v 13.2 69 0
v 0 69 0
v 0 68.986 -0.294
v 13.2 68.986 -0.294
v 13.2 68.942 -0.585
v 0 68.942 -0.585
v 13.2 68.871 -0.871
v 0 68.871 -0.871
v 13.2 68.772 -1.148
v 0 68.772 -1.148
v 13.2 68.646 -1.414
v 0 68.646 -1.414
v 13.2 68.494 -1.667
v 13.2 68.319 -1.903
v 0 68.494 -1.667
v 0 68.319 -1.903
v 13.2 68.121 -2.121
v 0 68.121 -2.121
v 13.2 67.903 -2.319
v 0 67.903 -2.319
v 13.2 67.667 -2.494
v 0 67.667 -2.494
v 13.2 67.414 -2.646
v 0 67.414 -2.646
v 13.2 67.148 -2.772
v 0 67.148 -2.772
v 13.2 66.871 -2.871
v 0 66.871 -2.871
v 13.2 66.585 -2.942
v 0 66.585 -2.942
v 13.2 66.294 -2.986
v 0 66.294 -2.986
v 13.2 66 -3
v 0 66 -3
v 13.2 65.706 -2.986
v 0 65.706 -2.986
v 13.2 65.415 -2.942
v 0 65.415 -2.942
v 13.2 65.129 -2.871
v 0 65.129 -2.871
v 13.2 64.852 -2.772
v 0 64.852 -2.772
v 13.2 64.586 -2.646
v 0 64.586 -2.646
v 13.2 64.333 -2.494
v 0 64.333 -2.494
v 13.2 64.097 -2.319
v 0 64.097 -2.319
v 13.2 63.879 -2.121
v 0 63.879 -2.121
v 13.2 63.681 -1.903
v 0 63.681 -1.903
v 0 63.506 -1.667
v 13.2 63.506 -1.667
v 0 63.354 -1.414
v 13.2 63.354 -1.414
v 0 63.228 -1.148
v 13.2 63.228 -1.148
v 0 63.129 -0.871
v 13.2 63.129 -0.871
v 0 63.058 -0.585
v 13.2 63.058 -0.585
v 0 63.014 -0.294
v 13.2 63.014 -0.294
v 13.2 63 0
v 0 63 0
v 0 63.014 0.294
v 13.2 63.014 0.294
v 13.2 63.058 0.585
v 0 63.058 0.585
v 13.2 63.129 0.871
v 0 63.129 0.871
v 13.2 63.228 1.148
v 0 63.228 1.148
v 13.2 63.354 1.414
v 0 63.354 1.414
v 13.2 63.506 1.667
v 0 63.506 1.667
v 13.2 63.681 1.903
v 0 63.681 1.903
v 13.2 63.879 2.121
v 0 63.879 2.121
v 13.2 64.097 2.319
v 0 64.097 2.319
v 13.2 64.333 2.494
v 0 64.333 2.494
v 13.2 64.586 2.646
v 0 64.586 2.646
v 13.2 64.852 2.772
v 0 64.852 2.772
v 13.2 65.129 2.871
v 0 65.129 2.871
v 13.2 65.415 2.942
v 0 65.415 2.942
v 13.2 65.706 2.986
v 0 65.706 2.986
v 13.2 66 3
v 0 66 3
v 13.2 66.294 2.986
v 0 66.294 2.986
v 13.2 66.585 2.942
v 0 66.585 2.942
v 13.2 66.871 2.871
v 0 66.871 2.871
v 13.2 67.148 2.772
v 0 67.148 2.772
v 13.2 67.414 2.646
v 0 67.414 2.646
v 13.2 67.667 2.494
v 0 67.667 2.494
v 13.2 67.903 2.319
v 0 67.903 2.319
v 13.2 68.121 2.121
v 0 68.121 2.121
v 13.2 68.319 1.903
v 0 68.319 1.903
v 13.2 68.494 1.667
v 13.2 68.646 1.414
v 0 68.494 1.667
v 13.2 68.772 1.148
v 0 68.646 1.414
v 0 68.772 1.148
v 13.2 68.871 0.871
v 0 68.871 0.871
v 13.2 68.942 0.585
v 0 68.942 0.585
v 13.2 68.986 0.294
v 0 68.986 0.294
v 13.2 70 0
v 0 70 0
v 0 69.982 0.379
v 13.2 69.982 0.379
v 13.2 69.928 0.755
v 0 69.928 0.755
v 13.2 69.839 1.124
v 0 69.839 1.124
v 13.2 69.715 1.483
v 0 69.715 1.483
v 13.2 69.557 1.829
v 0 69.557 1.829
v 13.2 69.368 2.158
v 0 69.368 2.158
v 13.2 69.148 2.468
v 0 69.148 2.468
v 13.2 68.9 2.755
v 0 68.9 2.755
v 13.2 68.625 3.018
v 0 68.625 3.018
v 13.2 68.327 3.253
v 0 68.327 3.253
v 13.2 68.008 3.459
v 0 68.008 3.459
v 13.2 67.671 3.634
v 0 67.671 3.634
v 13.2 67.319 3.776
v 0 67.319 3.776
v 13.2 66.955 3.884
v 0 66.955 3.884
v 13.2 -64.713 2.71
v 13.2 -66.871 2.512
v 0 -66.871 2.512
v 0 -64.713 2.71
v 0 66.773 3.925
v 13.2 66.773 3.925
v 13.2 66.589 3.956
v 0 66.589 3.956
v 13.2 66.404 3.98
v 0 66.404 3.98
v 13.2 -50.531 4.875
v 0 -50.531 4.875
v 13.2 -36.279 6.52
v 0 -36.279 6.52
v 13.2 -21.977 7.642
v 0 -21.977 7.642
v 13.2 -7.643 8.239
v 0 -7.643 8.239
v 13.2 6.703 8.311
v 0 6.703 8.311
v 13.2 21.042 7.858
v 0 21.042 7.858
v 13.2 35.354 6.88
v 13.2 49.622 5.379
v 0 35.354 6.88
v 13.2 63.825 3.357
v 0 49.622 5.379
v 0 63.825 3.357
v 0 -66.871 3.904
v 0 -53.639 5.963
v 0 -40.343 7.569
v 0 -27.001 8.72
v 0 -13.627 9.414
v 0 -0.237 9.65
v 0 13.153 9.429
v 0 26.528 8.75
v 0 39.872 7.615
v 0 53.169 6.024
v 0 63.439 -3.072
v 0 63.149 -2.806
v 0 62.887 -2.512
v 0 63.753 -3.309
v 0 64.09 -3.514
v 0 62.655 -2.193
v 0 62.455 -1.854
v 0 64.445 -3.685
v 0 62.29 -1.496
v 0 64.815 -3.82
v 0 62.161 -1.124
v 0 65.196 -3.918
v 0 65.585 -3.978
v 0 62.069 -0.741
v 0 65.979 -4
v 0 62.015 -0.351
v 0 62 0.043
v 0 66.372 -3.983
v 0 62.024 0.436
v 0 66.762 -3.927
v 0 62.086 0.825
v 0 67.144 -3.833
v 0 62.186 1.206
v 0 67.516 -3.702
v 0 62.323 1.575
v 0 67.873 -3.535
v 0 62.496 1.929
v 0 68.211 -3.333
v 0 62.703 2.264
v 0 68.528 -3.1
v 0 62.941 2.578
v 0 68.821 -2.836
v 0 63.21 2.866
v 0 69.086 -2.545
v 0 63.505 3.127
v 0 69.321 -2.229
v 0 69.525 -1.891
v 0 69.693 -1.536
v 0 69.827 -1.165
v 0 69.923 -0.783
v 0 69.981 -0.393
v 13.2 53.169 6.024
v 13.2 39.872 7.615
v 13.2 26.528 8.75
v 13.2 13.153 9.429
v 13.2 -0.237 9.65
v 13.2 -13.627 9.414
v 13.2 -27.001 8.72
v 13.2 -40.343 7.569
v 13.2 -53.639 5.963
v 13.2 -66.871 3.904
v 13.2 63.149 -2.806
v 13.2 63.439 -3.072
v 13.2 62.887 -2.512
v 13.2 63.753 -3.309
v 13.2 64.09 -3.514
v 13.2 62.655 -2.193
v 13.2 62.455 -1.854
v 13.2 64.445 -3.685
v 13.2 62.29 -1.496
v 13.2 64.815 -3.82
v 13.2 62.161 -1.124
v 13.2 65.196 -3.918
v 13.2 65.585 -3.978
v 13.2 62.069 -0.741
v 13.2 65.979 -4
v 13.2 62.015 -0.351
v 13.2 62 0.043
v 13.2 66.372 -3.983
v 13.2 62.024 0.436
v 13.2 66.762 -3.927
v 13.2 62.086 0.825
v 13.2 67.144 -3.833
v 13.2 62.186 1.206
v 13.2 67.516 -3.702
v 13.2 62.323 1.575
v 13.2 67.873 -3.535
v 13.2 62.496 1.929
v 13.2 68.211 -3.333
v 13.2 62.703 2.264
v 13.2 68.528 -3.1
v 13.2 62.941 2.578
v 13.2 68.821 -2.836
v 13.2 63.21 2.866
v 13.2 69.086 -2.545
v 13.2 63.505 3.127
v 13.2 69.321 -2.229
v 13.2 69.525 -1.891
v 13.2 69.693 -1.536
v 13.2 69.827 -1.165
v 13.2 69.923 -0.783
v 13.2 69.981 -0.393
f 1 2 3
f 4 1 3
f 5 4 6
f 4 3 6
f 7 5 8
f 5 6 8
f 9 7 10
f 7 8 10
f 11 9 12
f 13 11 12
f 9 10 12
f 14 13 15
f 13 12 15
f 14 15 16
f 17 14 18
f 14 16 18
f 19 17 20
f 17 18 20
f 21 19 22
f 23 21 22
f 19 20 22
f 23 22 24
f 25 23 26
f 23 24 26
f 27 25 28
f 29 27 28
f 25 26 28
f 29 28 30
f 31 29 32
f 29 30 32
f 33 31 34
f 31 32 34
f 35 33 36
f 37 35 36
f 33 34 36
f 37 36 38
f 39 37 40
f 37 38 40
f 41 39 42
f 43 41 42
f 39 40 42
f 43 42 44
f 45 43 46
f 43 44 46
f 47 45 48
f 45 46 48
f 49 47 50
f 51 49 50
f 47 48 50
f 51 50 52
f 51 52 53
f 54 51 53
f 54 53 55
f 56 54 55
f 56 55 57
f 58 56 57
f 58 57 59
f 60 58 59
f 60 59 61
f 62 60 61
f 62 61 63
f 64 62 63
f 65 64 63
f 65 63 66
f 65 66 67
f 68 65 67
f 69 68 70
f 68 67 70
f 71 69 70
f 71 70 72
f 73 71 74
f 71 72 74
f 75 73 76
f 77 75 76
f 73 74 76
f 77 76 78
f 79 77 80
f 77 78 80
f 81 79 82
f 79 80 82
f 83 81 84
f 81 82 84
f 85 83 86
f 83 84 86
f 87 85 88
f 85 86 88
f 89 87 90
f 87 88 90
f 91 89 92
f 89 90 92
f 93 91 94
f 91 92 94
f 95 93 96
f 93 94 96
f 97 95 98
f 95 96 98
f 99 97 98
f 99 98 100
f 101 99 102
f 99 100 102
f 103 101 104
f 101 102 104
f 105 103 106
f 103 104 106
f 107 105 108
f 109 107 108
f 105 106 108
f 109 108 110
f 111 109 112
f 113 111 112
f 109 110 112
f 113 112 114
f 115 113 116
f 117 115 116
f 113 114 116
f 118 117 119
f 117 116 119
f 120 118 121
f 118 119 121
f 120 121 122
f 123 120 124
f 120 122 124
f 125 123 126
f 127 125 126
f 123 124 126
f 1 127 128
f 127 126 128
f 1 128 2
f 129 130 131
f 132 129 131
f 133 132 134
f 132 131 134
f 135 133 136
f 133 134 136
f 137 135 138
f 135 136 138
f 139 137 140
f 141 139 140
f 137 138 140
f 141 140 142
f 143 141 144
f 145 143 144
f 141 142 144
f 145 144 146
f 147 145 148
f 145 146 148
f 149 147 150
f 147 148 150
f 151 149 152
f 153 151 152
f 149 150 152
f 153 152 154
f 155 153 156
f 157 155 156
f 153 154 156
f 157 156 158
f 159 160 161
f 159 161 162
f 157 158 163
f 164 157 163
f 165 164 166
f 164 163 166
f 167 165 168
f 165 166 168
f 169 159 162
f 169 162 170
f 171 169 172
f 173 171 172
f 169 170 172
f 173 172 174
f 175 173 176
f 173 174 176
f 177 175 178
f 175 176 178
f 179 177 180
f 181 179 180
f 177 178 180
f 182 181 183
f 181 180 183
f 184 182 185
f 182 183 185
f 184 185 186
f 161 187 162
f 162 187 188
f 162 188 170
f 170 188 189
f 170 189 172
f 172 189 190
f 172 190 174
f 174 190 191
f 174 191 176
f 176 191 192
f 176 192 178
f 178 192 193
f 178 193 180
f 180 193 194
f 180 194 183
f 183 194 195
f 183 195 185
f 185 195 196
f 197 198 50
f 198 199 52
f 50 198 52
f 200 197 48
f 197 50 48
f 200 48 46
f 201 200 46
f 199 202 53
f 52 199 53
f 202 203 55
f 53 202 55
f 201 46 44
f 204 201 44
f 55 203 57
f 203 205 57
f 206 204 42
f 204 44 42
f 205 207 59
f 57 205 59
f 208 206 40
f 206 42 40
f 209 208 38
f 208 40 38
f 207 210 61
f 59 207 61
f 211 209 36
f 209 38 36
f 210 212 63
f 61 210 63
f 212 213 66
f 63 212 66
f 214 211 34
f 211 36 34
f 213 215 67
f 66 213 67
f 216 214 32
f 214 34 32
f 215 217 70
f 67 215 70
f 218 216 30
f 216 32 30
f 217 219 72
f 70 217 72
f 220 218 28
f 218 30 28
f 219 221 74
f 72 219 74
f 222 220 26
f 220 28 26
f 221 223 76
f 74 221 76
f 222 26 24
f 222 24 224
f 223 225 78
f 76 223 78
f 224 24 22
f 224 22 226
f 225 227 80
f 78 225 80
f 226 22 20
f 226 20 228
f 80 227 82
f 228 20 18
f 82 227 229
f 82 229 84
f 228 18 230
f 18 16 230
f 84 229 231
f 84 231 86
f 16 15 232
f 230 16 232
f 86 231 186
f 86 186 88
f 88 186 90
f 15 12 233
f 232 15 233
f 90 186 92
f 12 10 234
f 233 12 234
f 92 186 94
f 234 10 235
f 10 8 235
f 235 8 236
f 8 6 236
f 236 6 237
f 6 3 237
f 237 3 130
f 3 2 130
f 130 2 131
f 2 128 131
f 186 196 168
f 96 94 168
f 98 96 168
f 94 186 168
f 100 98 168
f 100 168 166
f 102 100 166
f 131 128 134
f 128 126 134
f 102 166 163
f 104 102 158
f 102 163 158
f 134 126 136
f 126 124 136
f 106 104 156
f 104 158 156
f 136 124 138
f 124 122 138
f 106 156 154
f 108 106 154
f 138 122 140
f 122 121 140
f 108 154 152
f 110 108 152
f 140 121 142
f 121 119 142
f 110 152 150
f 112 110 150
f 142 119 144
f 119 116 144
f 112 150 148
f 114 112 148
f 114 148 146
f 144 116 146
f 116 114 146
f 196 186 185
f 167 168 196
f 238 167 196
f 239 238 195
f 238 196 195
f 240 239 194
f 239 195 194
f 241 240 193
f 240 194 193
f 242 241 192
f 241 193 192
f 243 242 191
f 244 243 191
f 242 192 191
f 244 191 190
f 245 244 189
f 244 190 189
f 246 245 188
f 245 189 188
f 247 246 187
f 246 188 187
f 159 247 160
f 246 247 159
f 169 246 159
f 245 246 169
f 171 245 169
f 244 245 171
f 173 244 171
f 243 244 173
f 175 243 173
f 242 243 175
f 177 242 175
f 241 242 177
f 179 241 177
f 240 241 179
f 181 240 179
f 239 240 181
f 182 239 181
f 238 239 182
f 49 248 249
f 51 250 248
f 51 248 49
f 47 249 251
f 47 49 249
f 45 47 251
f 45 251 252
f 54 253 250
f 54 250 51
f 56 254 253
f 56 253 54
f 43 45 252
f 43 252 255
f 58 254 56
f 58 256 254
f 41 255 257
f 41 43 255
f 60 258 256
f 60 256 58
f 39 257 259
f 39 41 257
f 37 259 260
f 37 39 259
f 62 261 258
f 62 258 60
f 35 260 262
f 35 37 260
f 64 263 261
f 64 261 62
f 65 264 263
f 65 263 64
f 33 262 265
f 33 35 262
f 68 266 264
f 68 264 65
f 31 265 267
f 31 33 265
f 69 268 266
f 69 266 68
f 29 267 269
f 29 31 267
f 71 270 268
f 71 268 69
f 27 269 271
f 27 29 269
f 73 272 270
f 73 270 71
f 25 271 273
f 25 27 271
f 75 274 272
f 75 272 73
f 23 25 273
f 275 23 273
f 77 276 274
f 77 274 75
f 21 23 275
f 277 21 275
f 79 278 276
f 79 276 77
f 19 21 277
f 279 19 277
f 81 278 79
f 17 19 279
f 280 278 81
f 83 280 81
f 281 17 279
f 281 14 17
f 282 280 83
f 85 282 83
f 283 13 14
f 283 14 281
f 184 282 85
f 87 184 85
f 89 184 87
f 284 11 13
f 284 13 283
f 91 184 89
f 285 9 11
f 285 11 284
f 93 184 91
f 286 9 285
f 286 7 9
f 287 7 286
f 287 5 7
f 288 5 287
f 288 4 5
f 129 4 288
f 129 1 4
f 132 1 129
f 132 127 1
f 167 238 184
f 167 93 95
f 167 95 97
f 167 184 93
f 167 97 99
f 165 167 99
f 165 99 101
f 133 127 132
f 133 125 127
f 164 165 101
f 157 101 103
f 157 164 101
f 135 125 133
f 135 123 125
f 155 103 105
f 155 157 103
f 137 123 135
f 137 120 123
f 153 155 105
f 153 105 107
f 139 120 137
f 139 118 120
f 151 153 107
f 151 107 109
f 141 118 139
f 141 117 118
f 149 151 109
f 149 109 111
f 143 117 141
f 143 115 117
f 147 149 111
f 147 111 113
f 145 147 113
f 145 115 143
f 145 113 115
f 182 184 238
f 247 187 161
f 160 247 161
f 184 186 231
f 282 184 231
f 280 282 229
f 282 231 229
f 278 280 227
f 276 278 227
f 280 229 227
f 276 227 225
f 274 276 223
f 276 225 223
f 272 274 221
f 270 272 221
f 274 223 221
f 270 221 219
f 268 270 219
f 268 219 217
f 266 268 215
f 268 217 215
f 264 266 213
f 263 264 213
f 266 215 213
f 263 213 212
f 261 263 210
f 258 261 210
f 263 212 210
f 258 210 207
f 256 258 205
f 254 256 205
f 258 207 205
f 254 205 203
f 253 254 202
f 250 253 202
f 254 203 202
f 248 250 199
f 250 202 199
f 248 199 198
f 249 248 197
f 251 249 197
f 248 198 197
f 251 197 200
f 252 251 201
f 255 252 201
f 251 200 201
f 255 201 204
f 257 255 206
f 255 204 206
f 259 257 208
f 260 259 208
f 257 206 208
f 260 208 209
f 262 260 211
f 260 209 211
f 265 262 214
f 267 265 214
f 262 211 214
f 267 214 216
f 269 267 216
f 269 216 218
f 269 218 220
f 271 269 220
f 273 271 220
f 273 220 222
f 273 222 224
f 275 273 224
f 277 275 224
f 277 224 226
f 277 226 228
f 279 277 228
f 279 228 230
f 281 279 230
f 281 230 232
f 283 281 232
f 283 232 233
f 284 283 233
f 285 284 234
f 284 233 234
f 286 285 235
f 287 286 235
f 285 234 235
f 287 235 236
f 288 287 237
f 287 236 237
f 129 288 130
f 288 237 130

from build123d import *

# Parameters (mm, degrees)
F1_DEPTH = 13.2


with BuildPart() as f1:
    # F0 (on Right) → F1 (new body)
    with BuildSketch(Plane.YZ):
        with BuildLine():
            ThreePointArc((63.824689, 3.356788), (64.089665, -3.514345), (70, 0))
            ThreePointArc((70, 0), (69.14794, 2.467888), (66.954764, 3.884382))
            ThreePointArc((66.954764, 3.884382), (66.679281, 3.932074), (66.403765, 3.97957))
            ThreePointArc((66.403765, 3.97957), (65.061087, 3.888244), (63.824689, 3.356788))
        make_face()
        with BuildLine():
            ThreePointArc((69, 0), (63.87868, -2.12132), (66, 3))
            ThreePointArc((66, 3), (68.12132, 2.12132), (69, 0))
        make_face(mode=Mode.SUBTRACT)
        with BuildLine():
            ThreePointArc((66.403765, 3.97957), (66.679281, 3.932074), (66.954764, 3.884382))
            ThreePointArc((66.954764, 3.884382), (66.68093, 3.941616), (66.403765, 3.97957))
        make_face()
        with BuildLine():
            ThreePointArc((-64.71288, 2.709856), (-0.470808, 8.340736), (63.824689, 3.356788))
            ThreePointArc((63.824689, 3.356788), (65.061087, 3.888244), (66.403765, 3.97957))
            ThreePointArc((66.403765, 3.97957), (-0.23707, 9.650483), (-66.871424, 3.903924))
            Line((-66.871424, 3.903924), (-66.871424, 2.512486))
            Line((-66.871424, 2.512486), (-64.71288, 2.709856))
        make_face()
    extrude(amount=F1_DEPTH)


solid = f1.part
